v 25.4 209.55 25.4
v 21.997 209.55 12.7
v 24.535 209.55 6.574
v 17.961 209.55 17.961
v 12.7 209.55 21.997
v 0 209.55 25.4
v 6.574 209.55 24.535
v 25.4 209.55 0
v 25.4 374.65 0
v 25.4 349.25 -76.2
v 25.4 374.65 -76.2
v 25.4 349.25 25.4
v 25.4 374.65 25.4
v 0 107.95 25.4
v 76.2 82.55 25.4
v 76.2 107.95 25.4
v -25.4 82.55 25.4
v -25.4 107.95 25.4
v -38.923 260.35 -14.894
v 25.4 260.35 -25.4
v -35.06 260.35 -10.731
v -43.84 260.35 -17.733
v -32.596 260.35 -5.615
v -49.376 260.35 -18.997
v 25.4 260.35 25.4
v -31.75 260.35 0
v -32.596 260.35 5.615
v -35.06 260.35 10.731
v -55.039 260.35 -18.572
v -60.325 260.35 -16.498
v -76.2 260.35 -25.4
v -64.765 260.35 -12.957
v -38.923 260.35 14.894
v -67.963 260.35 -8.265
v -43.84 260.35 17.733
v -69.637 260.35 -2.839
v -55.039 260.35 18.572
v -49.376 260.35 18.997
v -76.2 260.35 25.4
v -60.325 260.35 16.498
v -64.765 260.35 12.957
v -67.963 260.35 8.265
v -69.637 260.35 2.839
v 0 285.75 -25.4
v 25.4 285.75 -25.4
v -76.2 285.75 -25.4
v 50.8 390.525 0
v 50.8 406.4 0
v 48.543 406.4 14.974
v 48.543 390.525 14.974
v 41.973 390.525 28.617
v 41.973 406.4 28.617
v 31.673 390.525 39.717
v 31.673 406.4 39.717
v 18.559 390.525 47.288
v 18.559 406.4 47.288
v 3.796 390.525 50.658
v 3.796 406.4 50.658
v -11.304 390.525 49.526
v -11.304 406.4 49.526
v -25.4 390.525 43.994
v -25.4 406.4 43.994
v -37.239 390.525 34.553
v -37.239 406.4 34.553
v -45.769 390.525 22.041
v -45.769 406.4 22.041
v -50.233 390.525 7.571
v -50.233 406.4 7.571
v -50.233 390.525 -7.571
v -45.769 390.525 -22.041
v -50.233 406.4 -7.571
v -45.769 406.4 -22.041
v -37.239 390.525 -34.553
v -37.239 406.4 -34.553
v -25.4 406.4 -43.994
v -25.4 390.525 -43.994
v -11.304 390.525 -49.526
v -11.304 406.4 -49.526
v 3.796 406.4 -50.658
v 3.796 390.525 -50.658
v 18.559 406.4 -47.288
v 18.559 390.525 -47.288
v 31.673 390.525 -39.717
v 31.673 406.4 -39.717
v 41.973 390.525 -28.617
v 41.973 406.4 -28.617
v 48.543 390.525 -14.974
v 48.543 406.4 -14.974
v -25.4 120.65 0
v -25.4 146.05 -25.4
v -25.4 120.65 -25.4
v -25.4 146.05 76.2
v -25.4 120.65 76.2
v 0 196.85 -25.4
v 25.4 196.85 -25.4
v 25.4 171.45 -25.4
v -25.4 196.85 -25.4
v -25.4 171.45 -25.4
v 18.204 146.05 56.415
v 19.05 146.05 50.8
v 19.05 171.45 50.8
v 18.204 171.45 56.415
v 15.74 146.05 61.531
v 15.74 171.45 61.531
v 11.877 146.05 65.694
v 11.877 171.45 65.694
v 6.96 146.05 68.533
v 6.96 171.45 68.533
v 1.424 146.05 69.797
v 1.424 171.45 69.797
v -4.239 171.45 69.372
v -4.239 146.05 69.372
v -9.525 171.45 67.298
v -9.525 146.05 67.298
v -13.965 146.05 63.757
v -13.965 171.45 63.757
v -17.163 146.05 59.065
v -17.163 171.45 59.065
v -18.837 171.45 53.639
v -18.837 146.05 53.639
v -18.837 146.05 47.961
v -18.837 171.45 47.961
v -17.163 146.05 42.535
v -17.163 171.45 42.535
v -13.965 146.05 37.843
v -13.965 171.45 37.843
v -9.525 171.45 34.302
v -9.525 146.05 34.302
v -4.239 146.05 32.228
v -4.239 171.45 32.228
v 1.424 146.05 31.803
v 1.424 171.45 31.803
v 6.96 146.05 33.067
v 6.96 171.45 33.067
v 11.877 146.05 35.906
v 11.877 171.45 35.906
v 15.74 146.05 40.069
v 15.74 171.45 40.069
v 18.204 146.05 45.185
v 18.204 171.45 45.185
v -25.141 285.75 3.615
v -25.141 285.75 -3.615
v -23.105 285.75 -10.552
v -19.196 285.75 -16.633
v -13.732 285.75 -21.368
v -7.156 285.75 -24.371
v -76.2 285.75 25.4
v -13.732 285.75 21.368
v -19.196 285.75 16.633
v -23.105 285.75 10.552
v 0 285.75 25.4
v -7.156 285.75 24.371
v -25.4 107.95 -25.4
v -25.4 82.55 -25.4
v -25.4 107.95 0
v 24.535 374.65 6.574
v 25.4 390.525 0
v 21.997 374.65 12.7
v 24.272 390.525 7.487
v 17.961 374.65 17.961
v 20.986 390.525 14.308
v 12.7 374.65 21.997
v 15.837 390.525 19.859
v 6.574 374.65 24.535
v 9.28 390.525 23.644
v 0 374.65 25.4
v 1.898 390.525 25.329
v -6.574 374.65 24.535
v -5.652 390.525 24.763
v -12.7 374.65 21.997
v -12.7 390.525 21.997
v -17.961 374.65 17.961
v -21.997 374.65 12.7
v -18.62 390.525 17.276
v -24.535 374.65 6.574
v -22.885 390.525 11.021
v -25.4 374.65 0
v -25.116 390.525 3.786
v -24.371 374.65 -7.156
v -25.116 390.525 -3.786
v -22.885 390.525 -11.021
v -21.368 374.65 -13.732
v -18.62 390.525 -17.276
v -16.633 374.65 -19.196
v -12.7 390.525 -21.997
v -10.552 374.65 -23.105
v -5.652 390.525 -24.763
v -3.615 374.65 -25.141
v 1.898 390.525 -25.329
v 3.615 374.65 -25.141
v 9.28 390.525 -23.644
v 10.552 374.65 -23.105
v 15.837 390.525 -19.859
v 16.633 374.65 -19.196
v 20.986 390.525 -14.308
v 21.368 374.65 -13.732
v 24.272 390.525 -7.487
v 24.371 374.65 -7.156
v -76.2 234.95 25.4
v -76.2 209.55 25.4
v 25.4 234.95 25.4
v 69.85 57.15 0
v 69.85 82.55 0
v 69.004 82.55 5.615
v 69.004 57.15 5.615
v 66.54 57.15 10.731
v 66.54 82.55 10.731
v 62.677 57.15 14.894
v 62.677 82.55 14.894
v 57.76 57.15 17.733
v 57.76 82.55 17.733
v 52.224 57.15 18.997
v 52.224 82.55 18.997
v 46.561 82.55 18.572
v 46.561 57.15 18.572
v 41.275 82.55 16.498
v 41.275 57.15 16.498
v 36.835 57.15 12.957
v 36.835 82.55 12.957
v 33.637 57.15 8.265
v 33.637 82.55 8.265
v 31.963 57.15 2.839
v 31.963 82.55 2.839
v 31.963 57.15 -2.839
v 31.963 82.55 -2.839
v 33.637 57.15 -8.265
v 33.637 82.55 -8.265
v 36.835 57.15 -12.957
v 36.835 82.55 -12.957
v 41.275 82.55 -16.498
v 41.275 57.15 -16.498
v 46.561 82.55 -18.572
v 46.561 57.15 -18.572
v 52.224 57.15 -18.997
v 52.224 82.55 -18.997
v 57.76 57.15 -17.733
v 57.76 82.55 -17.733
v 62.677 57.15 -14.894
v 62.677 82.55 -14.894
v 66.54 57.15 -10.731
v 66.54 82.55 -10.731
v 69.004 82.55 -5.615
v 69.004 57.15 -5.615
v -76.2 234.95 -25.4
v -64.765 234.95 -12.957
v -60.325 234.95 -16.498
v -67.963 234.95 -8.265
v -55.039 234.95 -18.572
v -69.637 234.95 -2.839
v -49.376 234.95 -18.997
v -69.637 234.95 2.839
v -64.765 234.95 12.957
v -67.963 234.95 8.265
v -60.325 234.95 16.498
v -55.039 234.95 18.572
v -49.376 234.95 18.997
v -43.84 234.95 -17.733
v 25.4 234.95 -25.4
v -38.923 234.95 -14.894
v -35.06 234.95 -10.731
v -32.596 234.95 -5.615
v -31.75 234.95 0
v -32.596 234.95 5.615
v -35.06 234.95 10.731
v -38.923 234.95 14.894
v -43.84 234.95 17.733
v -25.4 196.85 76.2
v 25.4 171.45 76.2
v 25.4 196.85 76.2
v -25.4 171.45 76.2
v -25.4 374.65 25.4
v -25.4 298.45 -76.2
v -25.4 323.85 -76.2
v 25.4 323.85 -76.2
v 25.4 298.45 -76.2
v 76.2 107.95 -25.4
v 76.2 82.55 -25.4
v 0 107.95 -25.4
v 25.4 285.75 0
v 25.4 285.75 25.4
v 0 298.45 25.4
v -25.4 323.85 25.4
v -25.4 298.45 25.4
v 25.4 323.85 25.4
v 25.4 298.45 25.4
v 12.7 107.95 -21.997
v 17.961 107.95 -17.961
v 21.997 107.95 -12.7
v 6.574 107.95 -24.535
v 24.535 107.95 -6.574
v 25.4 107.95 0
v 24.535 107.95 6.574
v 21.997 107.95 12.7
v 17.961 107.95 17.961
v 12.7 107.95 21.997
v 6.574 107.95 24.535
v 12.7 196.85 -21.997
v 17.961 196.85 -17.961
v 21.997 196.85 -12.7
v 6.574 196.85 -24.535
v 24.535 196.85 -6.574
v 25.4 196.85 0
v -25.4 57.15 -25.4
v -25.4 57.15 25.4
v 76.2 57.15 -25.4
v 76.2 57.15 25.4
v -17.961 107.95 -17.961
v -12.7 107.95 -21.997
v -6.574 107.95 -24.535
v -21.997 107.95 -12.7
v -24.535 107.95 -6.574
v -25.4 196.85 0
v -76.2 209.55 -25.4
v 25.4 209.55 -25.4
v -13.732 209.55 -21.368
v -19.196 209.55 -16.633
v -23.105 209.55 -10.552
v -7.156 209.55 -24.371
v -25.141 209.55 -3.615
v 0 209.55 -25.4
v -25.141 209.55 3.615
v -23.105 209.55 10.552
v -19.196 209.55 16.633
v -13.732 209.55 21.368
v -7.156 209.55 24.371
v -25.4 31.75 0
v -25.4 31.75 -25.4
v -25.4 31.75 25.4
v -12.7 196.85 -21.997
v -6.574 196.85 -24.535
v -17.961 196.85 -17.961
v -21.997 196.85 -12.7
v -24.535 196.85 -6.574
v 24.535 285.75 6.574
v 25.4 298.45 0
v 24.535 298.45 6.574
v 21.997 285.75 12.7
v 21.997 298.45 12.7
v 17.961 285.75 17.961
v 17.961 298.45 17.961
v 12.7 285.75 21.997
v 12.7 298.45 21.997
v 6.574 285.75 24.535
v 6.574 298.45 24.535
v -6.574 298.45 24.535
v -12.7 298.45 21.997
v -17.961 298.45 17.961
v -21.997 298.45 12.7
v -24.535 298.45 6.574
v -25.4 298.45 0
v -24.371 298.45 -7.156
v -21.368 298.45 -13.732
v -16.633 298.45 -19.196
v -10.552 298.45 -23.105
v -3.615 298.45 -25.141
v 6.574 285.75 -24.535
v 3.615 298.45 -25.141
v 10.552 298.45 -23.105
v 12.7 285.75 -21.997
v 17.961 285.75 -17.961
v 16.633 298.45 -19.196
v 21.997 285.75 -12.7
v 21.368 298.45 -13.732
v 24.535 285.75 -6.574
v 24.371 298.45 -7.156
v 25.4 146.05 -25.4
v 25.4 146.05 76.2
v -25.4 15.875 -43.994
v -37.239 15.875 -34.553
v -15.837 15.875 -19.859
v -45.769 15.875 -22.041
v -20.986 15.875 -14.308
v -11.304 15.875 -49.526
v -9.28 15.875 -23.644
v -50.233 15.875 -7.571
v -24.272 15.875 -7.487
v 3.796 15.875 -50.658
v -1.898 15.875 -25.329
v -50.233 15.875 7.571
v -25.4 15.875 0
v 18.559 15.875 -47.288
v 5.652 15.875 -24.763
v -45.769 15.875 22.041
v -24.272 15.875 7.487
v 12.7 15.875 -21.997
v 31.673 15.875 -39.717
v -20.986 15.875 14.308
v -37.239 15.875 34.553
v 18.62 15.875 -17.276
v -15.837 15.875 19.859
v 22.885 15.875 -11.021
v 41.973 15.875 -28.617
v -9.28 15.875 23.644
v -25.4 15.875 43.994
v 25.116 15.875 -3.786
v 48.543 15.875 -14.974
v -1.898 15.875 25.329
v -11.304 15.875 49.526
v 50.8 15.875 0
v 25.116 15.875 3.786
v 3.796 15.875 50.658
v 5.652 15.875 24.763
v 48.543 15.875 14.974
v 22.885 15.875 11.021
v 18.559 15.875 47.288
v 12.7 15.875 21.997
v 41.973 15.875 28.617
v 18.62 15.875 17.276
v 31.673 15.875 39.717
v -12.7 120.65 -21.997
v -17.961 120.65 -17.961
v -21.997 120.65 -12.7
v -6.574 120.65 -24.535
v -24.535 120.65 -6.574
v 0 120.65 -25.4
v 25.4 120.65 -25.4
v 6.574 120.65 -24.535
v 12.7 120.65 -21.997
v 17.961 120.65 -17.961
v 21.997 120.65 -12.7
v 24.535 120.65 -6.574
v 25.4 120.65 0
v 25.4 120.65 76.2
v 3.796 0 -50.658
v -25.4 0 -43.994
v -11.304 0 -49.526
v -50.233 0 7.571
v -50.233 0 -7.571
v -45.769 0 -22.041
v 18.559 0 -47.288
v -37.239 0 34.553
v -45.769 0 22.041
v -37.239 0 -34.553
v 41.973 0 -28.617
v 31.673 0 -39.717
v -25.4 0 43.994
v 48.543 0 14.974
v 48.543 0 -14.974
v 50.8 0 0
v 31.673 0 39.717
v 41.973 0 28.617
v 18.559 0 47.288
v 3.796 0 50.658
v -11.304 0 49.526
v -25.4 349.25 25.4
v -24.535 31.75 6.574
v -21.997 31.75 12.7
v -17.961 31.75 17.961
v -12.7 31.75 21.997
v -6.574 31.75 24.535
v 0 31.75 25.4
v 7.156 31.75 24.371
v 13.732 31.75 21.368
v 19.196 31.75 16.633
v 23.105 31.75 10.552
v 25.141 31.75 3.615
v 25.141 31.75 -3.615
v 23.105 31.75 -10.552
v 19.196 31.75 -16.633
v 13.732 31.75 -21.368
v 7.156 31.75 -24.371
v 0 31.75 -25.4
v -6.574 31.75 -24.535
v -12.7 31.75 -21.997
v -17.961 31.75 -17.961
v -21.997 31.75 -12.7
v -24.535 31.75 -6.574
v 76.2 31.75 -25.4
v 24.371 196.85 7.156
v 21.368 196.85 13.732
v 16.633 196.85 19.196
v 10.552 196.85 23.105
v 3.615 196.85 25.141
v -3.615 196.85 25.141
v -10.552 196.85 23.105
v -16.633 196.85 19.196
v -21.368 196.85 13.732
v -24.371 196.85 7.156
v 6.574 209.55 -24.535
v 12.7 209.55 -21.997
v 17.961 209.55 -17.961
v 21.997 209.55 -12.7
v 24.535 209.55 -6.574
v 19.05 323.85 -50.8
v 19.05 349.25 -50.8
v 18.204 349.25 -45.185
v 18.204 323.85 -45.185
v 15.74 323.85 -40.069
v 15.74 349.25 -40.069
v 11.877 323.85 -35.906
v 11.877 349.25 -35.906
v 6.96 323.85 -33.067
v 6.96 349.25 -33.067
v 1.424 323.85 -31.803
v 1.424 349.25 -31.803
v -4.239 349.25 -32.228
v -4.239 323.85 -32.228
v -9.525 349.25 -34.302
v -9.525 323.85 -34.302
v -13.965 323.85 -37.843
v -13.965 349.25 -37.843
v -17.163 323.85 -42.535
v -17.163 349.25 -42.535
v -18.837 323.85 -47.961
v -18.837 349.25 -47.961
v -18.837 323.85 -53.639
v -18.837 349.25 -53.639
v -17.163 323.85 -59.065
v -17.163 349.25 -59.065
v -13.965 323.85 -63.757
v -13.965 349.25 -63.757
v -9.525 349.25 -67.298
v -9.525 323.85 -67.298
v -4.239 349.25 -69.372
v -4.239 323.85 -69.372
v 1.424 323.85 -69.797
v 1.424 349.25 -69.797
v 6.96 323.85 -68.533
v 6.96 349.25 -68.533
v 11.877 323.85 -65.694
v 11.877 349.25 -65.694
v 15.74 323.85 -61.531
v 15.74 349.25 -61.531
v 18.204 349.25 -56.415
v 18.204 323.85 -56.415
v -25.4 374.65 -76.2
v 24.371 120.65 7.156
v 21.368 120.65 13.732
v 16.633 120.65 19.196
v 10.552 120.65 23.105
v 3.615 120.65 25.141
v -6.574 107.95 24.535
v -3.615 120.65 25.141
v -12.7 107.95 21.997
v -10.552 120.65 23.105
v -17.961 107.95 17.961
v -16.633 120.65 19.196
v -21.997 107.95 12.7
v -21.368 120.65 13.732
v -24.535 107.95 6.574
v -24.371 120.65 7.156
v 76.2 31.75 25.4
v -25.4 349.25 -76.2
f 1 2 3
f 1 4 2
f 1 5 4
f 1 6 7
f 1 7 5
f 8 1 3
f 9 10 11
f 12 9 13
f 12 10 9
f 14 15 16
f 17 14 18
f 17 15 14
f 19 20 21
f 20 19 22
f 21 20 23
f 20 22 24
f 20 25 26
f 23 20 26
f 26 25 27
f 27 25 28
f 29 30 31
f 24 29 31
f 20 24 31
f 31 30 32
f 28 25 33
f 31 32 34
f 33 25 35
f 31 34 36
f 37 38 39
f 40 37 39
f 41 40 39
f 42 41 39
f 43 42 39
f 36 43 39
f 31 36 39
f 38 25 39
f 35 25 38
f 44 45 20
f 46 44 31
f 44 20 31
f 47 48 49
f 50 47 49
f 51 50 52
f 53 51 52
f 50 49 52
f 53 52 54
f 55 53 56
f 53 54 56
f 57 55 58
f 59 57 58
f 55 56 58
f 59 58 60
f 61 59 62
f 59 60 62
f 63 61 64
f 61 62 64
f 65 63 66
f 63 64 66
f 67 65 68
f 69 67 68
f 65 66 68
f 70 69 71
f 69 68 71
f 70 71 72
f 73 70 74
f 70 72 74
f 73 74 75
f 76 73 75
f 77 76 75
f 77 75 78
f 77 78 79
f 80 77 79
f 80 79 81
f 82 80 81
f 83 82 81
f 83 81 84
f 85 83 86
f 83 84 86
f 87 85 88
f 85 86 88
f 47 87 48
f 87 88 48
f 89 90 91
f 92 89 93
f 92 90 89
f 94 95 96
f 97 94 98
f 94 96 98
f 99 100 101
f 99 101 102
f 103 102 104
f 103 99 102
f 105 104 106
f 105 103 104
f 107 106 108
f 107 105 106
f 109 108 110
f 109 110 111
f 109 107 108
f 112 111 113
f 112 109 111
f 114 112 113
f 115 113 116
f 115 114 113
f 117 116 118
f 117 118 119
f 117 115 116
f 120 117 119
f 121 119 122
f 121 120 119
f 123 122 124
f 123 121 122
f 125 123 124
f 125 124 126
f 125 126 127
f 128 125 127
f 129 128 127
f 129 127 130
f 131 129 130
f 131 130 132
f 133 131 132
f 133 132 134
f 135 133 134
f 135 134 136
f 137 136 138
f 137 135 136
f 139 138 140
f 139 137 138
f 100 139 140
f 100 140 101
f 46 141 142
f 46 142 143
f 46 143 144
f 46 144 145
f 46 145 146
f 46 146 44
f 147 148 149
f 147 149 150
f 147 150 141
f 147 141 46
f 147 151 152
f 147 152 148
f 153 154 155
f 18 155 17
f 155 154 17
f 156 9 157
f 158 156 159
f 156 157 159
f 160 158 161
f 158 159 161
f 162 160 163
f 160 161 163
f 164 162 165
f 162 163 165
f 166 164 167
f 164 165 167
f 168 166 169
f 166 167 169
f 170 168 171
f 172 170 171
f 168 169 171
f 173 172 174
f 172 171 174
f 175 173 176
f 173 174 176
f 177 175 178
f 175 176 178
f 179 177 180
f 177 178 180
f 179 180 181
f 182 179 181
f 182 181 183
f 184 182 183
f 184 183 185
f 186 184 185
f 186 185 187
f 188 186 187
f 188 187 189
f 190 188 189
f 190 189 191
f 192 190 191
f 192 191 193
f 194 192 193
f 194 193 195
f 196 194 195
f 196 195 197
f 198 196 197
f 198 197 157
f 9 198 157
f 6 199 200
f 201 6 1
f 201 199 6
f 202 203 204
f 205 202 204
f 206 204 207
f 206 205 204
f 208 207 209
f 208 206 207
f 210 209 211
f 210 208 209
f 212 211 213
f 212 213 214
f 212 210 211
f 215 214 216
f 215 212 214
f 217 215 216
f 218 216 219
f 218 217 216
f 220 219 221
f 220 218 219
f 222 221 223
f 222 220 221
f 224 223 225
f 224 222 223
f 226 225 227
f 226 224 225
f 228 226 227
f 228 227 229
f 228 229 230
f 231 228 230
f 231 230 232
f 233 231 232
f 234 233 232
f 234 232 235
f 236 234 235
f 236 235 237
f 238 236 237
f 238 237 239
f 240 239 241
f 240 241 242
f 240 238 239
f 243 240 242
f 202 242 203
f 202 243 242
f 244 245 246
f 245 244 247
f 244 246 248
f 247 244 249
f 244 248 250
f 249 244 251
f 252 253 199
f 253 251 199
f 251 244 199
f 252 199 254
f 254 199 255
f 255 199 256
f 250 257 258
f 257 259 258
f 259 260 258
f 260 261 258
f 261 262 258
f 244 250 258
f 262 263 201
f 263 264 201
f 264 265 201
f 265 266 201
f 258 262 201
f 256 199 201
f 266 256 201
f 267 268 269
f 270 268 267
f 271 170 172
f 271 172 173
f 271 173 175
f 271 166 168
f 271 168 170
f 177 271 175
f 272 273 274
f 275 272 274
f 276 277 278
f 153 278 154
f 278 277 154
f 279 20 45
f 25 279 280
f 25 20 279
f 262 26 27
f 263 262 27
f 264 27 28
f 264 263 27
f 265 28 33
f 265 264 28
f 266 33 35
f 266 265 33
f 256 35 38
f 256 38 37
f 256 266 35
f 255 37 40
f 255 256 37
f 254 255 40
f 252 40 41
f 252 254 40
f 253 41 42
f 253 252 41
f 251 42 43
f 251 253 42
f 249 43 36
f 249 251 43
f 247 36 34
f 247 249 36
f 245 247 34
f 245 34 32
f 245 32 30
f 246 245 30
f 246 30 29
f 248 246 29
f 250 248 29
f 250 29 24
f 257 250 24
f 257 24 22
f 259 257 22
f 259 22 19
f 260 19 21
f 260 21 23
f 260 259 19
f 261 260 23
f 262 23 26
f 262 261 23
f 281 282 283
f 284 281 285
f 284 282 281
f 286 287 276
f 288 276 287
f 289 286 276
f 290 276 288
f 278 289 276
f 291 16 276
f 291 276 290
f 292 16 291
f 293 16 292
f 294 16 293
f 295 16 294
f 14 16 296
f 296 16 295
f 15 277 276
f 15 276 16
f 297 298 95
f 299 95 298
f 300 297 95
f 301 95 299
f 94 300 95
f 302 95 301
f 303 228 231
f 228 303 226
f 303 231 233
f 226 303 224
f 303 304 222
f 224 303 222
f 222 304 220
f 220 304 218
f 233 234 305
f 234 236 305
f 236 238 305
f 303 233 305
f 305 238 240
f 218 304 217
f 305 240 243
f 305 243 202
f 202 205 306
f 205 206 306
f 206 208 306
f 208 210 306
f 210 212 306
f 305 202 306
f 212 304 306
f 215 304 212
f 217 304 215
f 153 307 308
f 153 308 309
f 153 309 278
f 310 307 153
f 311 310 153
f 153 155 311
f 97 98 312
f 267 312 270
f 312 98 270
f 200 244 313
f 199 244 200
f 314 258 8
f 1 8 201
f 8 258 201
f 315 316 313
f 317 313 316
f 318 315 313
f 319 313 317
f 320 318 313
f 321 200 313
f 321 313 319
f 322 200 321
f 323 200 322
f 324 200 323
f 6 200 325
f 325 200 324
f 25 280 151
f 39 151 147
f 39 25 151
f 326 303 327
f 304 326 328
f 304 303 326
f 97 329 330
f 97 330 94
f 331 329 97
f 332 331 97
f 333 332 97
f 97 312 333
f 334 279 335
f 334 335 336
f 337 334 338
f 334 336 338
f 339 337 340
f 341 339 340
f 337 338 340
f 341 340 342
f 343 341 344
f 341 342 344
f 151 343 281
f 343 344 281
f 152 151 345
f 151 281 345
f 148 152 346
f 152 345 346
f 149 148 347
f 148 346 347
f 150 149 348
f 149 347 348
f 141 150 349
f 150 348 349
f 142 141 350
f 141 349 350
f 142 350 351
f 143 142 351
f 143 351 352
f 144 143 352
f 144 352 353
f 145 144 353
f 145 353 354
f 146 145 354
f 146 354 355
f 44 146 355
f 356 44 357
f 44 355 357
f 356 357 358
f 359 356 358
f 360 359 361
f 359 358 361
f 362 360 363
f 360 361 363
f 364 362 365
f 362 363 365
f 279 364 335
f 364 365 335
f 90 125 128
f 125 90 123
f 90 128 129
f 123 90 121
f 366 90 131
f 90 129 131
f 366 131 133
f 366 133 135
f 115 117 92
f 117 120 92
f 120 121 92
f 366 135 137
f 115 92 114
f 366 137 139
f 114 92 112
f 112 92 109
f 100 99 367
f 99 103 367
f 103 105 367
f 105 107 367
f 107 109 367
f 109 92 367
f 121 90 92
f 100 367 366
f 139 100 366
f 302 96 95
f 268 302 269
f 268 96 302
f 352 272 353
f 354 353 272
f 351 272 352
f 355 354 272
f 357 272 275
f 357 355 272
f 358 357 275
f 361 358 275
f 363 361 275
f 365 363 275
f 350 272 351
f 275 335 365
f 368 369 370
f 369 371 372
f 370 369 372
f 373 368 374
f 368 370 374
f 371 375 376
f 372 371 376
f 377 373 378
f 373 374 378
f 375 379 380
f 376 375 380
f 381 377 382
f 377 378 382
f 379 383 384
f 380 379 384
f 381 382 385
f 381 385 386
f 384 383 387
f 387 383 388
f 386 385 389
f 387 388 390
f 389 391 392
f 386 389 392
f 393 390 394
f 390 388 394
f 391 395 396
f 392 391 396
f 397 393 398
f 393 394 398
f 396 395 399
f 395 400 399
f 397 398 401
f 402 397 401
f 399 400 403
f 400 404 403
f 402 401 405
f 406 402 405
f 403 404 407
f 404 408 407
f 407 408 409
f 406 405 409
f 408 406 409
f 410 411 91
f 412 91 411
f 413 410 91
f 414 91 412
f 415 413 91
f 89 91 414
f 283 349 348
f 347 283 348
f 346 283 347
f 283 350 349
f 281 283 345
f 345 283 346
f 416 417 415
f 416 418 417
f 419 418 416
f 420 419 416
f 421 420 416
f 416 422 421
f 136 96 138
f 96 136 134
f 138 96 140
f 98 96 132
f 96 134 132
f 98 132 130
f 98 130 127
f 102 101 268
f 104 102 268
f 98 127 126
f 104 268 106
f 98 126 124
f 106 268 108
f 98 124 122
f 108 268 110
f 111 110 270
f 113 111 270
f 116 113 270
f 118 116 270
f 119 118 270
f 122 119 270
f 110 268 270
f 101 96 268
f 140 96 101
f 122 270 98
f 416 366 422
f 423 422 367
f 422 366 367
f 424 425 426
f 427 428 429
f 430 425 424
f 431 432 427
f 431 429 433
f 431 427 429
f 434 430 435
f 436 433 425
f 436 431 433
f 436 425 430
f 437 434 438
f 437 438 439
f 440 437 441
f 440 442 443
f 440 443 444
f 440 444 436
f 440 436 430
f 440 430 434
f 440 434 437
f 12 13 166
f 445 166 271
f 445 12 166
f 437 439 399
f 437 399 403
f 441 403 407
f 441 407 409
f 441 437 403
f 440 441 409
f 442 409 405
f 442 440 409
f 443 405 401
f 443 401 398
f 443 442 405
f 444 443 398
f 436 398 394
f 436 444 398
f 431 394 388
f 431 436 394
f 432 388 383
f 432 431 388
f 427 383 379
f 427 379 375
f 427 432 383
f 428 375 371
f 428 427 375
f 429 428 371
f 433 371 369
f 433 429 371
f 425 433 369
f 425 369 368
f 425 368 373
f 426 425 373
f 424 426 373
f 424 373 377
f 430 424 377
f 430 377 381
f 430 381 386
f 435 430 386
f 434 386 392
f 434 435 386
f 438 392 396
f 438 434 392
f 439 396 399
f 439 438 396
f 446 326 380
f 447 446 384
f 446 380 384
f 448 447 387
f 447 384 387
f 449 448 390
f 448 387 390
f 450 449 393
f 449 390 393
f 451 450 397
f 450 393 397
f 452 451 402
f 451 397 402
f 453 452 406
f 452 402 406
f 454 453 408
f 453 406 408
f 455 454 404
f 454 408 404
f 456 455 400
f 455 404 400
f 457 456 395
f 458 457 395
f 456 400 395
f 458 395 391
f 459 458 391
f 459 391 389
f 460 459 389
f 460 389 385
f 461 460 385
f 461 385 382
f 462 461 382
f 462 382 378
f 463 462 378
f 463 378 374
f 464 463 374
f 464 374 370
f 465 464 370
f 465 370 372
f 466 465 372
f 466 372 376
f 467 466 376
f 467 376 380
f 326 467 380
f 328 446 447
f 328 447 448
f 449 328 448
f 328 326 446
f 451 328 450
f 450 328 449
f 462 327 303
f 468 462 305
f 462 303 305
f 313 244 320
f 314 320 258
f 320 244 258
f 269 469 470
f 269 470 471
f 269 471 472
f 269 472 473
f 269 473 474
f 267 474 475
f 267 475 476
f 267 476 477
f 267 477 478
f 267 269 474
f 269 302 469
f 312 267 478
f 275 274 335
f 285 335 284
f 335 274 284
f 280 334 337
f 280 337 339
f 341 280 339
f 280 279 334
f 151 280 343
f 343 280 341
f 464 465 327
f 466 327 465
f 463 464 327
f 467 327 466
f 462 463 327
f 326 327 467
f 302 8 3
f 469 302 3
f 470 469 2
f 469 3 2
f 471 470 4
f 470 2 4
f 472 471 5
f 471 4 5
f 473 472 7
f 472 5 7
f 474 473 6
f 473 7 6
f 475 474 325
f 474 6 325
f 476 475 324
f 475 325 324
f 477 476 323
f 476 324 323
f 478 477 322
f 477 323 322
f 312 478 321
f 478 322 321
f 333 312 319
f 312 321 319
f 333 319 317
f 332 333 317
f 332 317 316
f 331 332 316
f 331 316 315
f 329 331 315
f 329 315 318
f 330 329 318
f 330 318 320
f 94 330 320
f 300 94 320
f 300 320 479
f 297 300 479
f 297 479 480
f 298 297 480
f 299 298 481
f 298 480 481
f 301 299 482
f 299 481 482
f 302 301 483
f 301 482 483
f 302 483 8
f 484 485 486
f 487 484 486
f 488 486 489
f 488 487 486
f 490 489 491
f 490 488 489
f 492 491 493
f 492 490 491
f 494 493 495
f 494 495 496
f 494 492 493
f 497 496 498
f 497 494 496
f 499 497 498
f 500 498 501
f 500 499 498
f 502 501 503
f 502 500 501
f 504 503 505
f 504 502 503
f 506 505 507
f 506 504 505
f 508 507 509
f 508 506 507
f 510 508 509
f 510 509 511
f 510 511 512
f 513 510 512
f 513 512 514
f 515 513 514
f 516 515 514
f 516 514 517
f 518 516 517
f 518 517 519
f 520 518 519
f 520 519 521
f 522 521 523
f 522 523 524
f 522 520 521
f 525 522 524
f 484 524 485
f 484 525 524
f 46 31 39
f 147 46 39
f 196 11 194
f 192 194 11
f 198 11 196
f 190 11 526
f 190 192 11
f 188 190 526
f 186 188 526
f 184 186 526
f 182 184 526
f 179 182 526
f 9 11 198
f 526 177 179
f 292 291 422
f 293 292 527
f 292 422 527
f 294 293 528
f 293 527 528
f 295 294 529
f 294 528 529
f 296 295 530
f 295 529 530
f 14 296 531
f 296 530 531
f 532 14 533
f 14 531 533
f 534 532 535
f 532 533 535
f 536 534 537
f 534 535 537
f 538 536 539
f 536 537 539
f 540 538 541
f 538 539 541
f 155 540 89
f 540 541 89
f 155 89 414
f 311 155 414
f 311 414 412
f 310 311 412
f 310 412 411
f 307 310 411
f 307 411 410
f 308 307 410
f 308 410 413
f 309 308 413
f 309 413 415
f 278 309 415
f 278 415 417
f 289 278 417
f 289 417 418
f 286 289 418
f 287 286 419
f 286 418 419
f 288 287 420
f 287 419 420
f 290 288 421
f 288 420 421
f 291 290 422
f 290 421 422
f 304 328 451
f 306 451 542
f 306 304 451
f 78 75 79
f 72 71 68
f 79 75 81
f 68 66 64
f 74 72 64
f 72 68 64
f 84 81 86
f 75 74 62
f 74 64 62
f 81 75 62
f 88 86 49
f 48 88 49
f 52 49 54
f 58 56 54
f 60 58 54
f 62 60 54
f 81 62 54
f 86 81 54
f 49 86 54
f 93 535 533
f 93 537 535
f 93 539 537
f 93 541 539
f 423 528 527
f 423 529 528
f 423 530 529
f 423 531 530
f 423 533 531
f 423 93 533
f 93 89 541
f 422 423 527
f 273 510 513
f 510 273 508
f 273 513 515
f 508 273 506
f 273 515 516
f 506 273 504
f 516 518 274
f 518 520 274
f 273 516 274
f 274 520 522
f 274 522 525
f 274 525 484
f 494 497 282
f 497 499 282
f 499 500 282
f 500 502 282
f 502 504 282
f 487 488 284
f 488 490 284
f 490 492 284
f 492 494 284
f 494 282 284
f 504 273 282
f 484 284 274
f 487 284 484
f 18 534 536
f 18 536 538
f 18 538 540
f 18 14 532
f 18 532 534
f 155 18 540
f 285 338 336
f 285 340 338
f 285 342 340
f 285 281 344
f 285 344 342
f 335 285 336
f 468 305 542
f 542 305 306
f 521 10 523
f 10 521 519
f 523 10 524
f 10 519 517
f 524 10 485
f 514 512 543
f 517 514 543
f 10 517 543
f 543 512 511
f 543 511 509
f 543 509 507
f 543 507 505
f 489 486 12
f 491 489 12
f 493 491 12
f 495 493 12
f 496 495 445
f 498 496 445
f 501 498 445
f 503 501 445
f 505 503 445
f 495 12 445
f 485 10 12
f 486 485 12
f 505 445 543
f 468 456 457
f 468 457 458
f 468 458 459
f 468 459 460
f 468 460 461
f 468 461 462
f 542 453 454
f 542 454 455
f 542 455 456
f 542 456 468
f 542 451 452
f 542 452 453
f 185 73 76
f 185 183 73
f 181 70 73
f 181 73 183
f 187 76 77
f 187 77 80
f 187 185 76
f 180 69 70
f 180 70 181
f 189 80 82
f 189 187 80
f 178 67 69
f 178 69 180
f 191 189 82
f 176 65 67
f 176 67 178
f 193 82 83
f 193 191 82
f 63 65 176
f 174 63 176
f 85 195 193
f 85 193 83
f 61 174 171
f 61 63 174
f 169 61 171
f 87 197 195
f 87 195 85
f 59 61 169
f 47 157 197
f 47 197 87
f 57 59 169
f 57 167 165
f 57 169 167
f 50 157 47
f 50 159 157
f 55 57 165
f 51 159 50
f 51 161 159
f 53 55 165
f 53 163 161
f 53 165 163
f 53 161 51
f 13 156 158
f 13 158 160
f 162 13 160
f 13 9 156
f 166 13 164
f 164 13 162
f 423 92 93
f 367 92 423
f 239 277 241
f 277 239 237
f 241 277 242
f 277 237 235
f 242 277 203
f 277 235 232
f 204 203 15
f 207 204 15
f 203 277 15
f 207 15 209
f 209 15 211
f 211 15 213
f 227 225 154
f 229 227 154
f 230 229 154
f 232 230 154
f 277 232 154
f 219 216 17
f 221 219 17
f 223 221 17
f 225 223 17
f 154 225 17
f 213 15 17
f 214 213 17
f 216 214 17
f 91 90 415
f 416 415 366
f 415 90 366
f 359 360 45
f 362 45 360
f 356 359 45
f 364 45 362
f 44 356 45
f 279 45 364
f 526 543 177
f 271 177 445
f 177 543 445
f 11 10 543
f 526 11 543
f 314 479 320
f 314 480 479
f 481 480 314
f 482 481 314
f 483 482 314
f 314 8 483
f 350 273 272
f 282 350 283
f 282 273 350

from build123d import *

# Parameters (mm, degrees)
F5_R      = 50.8
F6_DEPTH  = 15.875
F7_R      = 50.8
F8_DEPTH  = 15.875
F9_R      = 19.05
F10_DEPTH = 25.4
F11_R     = 19.05
F12_DEPTH = 25.4
F13_R     = 19.05
F14_DEPTH = 25.4
F15_R     = 19.05
F16_DEPTH = 25.4
F17_W     = 50.8
F17_H     = 101.6
F18_DEPTH = 25.4
F19_W     = 50.8
F19_H     = 101.6
F20_DEPTH = 25.4
F21_W     = 101.6
F21_H     = 50.8
F22_DEPTH = 25.4
F23_W     = 101.6
F23_H     = 50.8
F24_DEPTH = 25.4
F25_W     = 50.8
F25_H     = 101.6
F26_DEPTH = 25.4
F27_W     = 50.8
F27_H     = 101.6
F28_DEPTH = 25.4
F29_W     = 101.6
F29_H     = 50.8
F30_DEPTH = 25.4
F31_W     = 101.6
F31_H     = 50.8
F32_DEPTH = 25.4
F33_R     = 25.4
F34_DEPTH = 15.875
F35_R     = 25.4
F36_DEPTH = 12.7
F37_R     = 25.4
F38_DEPTH = 12.7
F39_R     = 25.4
F40_DEPTH = 12.7
F41_R     = 25.4
F42_DEPTH = 15.875


with BuildPart() as f6:
    # F5 (on offset) → F6 (new body)
    with BuildSketch(Plane.XZ.offset(-406.4)):
        Circle(F5_R)
    extrude(amount=F6_DEPTH)



with BuildPart() as f8:
    # F7 (on Front) → F8 (new body)
    with BuildSketch(Plane.XZ):
        Circle(F7_R)
    extrude(amount=-F8_DEPTH)



with BuildPart() as f10:
    # F9 (on offset) → F10 (new body)
    with BuildSketch(Plane.XZ.offset(-57.15)):
        with Locations((50.8, 0)):
            Circle(F9_R)
    extrude(amount=-F10_DEPTH)

    # F29 (on face) → F30 (join)
    with BuildSketch(Plane.XZ.offset(-57.15)):
        with Locations((25.4, 0)):
            Rectangle(F29_W, F29_H)
    extrude(amount=F30_DEPTH)

    # F31 (on face) → F32 (join)
    with BuildSketch(Plane(origin=(0, 82.55, 0), x_dir=(-1, 0, 0), z_dir=(0, 1, 0))):
        with Locations((-25.4, 0)):
            Rectangle(F31_W, F31_H)
    extrude(amount=F32_DEPTH)


with BuildPart() as f12:
    # F11 (on offset) → F12 (new body)
    with BuildSketch(Plane.XZ.offset(-146.05)):
        with Locations((0, 50.8)):
            Circle(F11_R)
    extrude(amount=-F12_DEPTH)

    # F25 (on face) → F26 (join)
    with BuildSketch(Plane.XZ.offset(-146.05)):
        with Locations((0, 25.4)):
            Rectangle(F25_W, F25_H)
    extrude(amount=F26_DEPTH)

    # F27 (on face) → F28 (join)
    with BuildSketch(Plane(origin=(0, 171.45, 0), x_dir=(-1, 0, 0), z_dir=(0, 1, 0))):
        with Locations((0, 25.4)):
            Rectangle(F27_W, F27_H)
    extrude(amount=F28_DEPTH)


with BuildPart() as f14:
    # F13 (on offset) → F14 (new body)
    with BuildSketch(Plane.XZ.offset(-234.95)):
        with Locations((-50.8, 0)):
            Circle(F13_R)
    extrude(amount=-F14_DEPTH)

    # F21 (on face) → F22 (join)
    with BuildSketch(Plane.XZ.offset(-234.95)):
        with Locations((-25.4, 0)):
            Rectangle(F21_W, F21_H)
    extrude(amount=F22_DEPTH)

    # F23 (on face) → F24 (join)
    with BuildSketch(Plane(origin=(0, 260.35, 0), x_dir=(-1, 0, 0), z_dir=(0, 1, 0))):
        with Locations((25.4, 0)):
            Rectangle(F23_W, F23_H)
    extrude(amount=F24_DEPTH)


with BuildPart() as f16:
    # F15 (on offset) → F16 (new body)
    with BuildSketch(Plane.XZ.offset(-323.85)):
        with Locations((0, -50.8)):
            Circle(F15_R)
    extrude(amount=-F16_DEPTH)

    # F17 (on face) → F18 (join)
    with BuildSketch(Plane.XZ.offset(-323.85)):
        with Locations((0, -25.4)):
            Rectangle(F17_W, F17_H)
    extrude(amount=F18_DEPTH)

    # F19 (on face) → F20 (join)
    with BuildSketch(Plane(origin=(0, 349.25, 0), x_dir=(-1, 0, 0), z_dir=(0, 1, 0))):
        with Locations((0, -25.4)):
            Rectangle(F19_W, F19_H)
    extrude(amount=F20_DEPTH)


with BuildPart() as f8_1:
    add(f8.part)

    add(f10.part)  # F34 merges F10
    # F33 (on face) → F34 (join, through all)
    with BuildSketch(Plane(origin=(0, 15.875, 0), x_dir=(-1, 0, 0), z_dir=(0, 1, 0))):
        Circle(F33_R)
    extrude(amount=F34_DEPTH)


    add(f12.part)  # F36 merges F12
    # F35 (on face) → F36 (join, through all)
    with BuildSketch(Plane.XZ.offset(-120.65)):
        Circle(F35_R)
    extrude(amount=F36_DEPTH)


    add(f14.part)  # F38 merges F14
    # F37 (on face) → F38 (join, through all)
    with BuildSketch(Plane.XZ.offset(-209.55)):
        Circle(F37_R)
    extrude(amount=F38_DEPTH)


    add(f16.part)  # F40 merges F16
    # F39 (on face) → F40 (join, through all)
    with BuildSketch(Plane.XZ.offset(-298.45)):
        Circle(F39_R)
    extrude(amount=F40_DEPTH)


with BuildPart() as f6_1:
    add(f6.part)

    add(f8_1.part)  # F42 merges F8
    # F41 (on face) → F42 (join, through all)
    with BuildSketch(Plane.XZ.offset(-390.525)):
        Circle(F41_R)
    extrude(amount=F42_DEPTH)


solid = f6_1.part
